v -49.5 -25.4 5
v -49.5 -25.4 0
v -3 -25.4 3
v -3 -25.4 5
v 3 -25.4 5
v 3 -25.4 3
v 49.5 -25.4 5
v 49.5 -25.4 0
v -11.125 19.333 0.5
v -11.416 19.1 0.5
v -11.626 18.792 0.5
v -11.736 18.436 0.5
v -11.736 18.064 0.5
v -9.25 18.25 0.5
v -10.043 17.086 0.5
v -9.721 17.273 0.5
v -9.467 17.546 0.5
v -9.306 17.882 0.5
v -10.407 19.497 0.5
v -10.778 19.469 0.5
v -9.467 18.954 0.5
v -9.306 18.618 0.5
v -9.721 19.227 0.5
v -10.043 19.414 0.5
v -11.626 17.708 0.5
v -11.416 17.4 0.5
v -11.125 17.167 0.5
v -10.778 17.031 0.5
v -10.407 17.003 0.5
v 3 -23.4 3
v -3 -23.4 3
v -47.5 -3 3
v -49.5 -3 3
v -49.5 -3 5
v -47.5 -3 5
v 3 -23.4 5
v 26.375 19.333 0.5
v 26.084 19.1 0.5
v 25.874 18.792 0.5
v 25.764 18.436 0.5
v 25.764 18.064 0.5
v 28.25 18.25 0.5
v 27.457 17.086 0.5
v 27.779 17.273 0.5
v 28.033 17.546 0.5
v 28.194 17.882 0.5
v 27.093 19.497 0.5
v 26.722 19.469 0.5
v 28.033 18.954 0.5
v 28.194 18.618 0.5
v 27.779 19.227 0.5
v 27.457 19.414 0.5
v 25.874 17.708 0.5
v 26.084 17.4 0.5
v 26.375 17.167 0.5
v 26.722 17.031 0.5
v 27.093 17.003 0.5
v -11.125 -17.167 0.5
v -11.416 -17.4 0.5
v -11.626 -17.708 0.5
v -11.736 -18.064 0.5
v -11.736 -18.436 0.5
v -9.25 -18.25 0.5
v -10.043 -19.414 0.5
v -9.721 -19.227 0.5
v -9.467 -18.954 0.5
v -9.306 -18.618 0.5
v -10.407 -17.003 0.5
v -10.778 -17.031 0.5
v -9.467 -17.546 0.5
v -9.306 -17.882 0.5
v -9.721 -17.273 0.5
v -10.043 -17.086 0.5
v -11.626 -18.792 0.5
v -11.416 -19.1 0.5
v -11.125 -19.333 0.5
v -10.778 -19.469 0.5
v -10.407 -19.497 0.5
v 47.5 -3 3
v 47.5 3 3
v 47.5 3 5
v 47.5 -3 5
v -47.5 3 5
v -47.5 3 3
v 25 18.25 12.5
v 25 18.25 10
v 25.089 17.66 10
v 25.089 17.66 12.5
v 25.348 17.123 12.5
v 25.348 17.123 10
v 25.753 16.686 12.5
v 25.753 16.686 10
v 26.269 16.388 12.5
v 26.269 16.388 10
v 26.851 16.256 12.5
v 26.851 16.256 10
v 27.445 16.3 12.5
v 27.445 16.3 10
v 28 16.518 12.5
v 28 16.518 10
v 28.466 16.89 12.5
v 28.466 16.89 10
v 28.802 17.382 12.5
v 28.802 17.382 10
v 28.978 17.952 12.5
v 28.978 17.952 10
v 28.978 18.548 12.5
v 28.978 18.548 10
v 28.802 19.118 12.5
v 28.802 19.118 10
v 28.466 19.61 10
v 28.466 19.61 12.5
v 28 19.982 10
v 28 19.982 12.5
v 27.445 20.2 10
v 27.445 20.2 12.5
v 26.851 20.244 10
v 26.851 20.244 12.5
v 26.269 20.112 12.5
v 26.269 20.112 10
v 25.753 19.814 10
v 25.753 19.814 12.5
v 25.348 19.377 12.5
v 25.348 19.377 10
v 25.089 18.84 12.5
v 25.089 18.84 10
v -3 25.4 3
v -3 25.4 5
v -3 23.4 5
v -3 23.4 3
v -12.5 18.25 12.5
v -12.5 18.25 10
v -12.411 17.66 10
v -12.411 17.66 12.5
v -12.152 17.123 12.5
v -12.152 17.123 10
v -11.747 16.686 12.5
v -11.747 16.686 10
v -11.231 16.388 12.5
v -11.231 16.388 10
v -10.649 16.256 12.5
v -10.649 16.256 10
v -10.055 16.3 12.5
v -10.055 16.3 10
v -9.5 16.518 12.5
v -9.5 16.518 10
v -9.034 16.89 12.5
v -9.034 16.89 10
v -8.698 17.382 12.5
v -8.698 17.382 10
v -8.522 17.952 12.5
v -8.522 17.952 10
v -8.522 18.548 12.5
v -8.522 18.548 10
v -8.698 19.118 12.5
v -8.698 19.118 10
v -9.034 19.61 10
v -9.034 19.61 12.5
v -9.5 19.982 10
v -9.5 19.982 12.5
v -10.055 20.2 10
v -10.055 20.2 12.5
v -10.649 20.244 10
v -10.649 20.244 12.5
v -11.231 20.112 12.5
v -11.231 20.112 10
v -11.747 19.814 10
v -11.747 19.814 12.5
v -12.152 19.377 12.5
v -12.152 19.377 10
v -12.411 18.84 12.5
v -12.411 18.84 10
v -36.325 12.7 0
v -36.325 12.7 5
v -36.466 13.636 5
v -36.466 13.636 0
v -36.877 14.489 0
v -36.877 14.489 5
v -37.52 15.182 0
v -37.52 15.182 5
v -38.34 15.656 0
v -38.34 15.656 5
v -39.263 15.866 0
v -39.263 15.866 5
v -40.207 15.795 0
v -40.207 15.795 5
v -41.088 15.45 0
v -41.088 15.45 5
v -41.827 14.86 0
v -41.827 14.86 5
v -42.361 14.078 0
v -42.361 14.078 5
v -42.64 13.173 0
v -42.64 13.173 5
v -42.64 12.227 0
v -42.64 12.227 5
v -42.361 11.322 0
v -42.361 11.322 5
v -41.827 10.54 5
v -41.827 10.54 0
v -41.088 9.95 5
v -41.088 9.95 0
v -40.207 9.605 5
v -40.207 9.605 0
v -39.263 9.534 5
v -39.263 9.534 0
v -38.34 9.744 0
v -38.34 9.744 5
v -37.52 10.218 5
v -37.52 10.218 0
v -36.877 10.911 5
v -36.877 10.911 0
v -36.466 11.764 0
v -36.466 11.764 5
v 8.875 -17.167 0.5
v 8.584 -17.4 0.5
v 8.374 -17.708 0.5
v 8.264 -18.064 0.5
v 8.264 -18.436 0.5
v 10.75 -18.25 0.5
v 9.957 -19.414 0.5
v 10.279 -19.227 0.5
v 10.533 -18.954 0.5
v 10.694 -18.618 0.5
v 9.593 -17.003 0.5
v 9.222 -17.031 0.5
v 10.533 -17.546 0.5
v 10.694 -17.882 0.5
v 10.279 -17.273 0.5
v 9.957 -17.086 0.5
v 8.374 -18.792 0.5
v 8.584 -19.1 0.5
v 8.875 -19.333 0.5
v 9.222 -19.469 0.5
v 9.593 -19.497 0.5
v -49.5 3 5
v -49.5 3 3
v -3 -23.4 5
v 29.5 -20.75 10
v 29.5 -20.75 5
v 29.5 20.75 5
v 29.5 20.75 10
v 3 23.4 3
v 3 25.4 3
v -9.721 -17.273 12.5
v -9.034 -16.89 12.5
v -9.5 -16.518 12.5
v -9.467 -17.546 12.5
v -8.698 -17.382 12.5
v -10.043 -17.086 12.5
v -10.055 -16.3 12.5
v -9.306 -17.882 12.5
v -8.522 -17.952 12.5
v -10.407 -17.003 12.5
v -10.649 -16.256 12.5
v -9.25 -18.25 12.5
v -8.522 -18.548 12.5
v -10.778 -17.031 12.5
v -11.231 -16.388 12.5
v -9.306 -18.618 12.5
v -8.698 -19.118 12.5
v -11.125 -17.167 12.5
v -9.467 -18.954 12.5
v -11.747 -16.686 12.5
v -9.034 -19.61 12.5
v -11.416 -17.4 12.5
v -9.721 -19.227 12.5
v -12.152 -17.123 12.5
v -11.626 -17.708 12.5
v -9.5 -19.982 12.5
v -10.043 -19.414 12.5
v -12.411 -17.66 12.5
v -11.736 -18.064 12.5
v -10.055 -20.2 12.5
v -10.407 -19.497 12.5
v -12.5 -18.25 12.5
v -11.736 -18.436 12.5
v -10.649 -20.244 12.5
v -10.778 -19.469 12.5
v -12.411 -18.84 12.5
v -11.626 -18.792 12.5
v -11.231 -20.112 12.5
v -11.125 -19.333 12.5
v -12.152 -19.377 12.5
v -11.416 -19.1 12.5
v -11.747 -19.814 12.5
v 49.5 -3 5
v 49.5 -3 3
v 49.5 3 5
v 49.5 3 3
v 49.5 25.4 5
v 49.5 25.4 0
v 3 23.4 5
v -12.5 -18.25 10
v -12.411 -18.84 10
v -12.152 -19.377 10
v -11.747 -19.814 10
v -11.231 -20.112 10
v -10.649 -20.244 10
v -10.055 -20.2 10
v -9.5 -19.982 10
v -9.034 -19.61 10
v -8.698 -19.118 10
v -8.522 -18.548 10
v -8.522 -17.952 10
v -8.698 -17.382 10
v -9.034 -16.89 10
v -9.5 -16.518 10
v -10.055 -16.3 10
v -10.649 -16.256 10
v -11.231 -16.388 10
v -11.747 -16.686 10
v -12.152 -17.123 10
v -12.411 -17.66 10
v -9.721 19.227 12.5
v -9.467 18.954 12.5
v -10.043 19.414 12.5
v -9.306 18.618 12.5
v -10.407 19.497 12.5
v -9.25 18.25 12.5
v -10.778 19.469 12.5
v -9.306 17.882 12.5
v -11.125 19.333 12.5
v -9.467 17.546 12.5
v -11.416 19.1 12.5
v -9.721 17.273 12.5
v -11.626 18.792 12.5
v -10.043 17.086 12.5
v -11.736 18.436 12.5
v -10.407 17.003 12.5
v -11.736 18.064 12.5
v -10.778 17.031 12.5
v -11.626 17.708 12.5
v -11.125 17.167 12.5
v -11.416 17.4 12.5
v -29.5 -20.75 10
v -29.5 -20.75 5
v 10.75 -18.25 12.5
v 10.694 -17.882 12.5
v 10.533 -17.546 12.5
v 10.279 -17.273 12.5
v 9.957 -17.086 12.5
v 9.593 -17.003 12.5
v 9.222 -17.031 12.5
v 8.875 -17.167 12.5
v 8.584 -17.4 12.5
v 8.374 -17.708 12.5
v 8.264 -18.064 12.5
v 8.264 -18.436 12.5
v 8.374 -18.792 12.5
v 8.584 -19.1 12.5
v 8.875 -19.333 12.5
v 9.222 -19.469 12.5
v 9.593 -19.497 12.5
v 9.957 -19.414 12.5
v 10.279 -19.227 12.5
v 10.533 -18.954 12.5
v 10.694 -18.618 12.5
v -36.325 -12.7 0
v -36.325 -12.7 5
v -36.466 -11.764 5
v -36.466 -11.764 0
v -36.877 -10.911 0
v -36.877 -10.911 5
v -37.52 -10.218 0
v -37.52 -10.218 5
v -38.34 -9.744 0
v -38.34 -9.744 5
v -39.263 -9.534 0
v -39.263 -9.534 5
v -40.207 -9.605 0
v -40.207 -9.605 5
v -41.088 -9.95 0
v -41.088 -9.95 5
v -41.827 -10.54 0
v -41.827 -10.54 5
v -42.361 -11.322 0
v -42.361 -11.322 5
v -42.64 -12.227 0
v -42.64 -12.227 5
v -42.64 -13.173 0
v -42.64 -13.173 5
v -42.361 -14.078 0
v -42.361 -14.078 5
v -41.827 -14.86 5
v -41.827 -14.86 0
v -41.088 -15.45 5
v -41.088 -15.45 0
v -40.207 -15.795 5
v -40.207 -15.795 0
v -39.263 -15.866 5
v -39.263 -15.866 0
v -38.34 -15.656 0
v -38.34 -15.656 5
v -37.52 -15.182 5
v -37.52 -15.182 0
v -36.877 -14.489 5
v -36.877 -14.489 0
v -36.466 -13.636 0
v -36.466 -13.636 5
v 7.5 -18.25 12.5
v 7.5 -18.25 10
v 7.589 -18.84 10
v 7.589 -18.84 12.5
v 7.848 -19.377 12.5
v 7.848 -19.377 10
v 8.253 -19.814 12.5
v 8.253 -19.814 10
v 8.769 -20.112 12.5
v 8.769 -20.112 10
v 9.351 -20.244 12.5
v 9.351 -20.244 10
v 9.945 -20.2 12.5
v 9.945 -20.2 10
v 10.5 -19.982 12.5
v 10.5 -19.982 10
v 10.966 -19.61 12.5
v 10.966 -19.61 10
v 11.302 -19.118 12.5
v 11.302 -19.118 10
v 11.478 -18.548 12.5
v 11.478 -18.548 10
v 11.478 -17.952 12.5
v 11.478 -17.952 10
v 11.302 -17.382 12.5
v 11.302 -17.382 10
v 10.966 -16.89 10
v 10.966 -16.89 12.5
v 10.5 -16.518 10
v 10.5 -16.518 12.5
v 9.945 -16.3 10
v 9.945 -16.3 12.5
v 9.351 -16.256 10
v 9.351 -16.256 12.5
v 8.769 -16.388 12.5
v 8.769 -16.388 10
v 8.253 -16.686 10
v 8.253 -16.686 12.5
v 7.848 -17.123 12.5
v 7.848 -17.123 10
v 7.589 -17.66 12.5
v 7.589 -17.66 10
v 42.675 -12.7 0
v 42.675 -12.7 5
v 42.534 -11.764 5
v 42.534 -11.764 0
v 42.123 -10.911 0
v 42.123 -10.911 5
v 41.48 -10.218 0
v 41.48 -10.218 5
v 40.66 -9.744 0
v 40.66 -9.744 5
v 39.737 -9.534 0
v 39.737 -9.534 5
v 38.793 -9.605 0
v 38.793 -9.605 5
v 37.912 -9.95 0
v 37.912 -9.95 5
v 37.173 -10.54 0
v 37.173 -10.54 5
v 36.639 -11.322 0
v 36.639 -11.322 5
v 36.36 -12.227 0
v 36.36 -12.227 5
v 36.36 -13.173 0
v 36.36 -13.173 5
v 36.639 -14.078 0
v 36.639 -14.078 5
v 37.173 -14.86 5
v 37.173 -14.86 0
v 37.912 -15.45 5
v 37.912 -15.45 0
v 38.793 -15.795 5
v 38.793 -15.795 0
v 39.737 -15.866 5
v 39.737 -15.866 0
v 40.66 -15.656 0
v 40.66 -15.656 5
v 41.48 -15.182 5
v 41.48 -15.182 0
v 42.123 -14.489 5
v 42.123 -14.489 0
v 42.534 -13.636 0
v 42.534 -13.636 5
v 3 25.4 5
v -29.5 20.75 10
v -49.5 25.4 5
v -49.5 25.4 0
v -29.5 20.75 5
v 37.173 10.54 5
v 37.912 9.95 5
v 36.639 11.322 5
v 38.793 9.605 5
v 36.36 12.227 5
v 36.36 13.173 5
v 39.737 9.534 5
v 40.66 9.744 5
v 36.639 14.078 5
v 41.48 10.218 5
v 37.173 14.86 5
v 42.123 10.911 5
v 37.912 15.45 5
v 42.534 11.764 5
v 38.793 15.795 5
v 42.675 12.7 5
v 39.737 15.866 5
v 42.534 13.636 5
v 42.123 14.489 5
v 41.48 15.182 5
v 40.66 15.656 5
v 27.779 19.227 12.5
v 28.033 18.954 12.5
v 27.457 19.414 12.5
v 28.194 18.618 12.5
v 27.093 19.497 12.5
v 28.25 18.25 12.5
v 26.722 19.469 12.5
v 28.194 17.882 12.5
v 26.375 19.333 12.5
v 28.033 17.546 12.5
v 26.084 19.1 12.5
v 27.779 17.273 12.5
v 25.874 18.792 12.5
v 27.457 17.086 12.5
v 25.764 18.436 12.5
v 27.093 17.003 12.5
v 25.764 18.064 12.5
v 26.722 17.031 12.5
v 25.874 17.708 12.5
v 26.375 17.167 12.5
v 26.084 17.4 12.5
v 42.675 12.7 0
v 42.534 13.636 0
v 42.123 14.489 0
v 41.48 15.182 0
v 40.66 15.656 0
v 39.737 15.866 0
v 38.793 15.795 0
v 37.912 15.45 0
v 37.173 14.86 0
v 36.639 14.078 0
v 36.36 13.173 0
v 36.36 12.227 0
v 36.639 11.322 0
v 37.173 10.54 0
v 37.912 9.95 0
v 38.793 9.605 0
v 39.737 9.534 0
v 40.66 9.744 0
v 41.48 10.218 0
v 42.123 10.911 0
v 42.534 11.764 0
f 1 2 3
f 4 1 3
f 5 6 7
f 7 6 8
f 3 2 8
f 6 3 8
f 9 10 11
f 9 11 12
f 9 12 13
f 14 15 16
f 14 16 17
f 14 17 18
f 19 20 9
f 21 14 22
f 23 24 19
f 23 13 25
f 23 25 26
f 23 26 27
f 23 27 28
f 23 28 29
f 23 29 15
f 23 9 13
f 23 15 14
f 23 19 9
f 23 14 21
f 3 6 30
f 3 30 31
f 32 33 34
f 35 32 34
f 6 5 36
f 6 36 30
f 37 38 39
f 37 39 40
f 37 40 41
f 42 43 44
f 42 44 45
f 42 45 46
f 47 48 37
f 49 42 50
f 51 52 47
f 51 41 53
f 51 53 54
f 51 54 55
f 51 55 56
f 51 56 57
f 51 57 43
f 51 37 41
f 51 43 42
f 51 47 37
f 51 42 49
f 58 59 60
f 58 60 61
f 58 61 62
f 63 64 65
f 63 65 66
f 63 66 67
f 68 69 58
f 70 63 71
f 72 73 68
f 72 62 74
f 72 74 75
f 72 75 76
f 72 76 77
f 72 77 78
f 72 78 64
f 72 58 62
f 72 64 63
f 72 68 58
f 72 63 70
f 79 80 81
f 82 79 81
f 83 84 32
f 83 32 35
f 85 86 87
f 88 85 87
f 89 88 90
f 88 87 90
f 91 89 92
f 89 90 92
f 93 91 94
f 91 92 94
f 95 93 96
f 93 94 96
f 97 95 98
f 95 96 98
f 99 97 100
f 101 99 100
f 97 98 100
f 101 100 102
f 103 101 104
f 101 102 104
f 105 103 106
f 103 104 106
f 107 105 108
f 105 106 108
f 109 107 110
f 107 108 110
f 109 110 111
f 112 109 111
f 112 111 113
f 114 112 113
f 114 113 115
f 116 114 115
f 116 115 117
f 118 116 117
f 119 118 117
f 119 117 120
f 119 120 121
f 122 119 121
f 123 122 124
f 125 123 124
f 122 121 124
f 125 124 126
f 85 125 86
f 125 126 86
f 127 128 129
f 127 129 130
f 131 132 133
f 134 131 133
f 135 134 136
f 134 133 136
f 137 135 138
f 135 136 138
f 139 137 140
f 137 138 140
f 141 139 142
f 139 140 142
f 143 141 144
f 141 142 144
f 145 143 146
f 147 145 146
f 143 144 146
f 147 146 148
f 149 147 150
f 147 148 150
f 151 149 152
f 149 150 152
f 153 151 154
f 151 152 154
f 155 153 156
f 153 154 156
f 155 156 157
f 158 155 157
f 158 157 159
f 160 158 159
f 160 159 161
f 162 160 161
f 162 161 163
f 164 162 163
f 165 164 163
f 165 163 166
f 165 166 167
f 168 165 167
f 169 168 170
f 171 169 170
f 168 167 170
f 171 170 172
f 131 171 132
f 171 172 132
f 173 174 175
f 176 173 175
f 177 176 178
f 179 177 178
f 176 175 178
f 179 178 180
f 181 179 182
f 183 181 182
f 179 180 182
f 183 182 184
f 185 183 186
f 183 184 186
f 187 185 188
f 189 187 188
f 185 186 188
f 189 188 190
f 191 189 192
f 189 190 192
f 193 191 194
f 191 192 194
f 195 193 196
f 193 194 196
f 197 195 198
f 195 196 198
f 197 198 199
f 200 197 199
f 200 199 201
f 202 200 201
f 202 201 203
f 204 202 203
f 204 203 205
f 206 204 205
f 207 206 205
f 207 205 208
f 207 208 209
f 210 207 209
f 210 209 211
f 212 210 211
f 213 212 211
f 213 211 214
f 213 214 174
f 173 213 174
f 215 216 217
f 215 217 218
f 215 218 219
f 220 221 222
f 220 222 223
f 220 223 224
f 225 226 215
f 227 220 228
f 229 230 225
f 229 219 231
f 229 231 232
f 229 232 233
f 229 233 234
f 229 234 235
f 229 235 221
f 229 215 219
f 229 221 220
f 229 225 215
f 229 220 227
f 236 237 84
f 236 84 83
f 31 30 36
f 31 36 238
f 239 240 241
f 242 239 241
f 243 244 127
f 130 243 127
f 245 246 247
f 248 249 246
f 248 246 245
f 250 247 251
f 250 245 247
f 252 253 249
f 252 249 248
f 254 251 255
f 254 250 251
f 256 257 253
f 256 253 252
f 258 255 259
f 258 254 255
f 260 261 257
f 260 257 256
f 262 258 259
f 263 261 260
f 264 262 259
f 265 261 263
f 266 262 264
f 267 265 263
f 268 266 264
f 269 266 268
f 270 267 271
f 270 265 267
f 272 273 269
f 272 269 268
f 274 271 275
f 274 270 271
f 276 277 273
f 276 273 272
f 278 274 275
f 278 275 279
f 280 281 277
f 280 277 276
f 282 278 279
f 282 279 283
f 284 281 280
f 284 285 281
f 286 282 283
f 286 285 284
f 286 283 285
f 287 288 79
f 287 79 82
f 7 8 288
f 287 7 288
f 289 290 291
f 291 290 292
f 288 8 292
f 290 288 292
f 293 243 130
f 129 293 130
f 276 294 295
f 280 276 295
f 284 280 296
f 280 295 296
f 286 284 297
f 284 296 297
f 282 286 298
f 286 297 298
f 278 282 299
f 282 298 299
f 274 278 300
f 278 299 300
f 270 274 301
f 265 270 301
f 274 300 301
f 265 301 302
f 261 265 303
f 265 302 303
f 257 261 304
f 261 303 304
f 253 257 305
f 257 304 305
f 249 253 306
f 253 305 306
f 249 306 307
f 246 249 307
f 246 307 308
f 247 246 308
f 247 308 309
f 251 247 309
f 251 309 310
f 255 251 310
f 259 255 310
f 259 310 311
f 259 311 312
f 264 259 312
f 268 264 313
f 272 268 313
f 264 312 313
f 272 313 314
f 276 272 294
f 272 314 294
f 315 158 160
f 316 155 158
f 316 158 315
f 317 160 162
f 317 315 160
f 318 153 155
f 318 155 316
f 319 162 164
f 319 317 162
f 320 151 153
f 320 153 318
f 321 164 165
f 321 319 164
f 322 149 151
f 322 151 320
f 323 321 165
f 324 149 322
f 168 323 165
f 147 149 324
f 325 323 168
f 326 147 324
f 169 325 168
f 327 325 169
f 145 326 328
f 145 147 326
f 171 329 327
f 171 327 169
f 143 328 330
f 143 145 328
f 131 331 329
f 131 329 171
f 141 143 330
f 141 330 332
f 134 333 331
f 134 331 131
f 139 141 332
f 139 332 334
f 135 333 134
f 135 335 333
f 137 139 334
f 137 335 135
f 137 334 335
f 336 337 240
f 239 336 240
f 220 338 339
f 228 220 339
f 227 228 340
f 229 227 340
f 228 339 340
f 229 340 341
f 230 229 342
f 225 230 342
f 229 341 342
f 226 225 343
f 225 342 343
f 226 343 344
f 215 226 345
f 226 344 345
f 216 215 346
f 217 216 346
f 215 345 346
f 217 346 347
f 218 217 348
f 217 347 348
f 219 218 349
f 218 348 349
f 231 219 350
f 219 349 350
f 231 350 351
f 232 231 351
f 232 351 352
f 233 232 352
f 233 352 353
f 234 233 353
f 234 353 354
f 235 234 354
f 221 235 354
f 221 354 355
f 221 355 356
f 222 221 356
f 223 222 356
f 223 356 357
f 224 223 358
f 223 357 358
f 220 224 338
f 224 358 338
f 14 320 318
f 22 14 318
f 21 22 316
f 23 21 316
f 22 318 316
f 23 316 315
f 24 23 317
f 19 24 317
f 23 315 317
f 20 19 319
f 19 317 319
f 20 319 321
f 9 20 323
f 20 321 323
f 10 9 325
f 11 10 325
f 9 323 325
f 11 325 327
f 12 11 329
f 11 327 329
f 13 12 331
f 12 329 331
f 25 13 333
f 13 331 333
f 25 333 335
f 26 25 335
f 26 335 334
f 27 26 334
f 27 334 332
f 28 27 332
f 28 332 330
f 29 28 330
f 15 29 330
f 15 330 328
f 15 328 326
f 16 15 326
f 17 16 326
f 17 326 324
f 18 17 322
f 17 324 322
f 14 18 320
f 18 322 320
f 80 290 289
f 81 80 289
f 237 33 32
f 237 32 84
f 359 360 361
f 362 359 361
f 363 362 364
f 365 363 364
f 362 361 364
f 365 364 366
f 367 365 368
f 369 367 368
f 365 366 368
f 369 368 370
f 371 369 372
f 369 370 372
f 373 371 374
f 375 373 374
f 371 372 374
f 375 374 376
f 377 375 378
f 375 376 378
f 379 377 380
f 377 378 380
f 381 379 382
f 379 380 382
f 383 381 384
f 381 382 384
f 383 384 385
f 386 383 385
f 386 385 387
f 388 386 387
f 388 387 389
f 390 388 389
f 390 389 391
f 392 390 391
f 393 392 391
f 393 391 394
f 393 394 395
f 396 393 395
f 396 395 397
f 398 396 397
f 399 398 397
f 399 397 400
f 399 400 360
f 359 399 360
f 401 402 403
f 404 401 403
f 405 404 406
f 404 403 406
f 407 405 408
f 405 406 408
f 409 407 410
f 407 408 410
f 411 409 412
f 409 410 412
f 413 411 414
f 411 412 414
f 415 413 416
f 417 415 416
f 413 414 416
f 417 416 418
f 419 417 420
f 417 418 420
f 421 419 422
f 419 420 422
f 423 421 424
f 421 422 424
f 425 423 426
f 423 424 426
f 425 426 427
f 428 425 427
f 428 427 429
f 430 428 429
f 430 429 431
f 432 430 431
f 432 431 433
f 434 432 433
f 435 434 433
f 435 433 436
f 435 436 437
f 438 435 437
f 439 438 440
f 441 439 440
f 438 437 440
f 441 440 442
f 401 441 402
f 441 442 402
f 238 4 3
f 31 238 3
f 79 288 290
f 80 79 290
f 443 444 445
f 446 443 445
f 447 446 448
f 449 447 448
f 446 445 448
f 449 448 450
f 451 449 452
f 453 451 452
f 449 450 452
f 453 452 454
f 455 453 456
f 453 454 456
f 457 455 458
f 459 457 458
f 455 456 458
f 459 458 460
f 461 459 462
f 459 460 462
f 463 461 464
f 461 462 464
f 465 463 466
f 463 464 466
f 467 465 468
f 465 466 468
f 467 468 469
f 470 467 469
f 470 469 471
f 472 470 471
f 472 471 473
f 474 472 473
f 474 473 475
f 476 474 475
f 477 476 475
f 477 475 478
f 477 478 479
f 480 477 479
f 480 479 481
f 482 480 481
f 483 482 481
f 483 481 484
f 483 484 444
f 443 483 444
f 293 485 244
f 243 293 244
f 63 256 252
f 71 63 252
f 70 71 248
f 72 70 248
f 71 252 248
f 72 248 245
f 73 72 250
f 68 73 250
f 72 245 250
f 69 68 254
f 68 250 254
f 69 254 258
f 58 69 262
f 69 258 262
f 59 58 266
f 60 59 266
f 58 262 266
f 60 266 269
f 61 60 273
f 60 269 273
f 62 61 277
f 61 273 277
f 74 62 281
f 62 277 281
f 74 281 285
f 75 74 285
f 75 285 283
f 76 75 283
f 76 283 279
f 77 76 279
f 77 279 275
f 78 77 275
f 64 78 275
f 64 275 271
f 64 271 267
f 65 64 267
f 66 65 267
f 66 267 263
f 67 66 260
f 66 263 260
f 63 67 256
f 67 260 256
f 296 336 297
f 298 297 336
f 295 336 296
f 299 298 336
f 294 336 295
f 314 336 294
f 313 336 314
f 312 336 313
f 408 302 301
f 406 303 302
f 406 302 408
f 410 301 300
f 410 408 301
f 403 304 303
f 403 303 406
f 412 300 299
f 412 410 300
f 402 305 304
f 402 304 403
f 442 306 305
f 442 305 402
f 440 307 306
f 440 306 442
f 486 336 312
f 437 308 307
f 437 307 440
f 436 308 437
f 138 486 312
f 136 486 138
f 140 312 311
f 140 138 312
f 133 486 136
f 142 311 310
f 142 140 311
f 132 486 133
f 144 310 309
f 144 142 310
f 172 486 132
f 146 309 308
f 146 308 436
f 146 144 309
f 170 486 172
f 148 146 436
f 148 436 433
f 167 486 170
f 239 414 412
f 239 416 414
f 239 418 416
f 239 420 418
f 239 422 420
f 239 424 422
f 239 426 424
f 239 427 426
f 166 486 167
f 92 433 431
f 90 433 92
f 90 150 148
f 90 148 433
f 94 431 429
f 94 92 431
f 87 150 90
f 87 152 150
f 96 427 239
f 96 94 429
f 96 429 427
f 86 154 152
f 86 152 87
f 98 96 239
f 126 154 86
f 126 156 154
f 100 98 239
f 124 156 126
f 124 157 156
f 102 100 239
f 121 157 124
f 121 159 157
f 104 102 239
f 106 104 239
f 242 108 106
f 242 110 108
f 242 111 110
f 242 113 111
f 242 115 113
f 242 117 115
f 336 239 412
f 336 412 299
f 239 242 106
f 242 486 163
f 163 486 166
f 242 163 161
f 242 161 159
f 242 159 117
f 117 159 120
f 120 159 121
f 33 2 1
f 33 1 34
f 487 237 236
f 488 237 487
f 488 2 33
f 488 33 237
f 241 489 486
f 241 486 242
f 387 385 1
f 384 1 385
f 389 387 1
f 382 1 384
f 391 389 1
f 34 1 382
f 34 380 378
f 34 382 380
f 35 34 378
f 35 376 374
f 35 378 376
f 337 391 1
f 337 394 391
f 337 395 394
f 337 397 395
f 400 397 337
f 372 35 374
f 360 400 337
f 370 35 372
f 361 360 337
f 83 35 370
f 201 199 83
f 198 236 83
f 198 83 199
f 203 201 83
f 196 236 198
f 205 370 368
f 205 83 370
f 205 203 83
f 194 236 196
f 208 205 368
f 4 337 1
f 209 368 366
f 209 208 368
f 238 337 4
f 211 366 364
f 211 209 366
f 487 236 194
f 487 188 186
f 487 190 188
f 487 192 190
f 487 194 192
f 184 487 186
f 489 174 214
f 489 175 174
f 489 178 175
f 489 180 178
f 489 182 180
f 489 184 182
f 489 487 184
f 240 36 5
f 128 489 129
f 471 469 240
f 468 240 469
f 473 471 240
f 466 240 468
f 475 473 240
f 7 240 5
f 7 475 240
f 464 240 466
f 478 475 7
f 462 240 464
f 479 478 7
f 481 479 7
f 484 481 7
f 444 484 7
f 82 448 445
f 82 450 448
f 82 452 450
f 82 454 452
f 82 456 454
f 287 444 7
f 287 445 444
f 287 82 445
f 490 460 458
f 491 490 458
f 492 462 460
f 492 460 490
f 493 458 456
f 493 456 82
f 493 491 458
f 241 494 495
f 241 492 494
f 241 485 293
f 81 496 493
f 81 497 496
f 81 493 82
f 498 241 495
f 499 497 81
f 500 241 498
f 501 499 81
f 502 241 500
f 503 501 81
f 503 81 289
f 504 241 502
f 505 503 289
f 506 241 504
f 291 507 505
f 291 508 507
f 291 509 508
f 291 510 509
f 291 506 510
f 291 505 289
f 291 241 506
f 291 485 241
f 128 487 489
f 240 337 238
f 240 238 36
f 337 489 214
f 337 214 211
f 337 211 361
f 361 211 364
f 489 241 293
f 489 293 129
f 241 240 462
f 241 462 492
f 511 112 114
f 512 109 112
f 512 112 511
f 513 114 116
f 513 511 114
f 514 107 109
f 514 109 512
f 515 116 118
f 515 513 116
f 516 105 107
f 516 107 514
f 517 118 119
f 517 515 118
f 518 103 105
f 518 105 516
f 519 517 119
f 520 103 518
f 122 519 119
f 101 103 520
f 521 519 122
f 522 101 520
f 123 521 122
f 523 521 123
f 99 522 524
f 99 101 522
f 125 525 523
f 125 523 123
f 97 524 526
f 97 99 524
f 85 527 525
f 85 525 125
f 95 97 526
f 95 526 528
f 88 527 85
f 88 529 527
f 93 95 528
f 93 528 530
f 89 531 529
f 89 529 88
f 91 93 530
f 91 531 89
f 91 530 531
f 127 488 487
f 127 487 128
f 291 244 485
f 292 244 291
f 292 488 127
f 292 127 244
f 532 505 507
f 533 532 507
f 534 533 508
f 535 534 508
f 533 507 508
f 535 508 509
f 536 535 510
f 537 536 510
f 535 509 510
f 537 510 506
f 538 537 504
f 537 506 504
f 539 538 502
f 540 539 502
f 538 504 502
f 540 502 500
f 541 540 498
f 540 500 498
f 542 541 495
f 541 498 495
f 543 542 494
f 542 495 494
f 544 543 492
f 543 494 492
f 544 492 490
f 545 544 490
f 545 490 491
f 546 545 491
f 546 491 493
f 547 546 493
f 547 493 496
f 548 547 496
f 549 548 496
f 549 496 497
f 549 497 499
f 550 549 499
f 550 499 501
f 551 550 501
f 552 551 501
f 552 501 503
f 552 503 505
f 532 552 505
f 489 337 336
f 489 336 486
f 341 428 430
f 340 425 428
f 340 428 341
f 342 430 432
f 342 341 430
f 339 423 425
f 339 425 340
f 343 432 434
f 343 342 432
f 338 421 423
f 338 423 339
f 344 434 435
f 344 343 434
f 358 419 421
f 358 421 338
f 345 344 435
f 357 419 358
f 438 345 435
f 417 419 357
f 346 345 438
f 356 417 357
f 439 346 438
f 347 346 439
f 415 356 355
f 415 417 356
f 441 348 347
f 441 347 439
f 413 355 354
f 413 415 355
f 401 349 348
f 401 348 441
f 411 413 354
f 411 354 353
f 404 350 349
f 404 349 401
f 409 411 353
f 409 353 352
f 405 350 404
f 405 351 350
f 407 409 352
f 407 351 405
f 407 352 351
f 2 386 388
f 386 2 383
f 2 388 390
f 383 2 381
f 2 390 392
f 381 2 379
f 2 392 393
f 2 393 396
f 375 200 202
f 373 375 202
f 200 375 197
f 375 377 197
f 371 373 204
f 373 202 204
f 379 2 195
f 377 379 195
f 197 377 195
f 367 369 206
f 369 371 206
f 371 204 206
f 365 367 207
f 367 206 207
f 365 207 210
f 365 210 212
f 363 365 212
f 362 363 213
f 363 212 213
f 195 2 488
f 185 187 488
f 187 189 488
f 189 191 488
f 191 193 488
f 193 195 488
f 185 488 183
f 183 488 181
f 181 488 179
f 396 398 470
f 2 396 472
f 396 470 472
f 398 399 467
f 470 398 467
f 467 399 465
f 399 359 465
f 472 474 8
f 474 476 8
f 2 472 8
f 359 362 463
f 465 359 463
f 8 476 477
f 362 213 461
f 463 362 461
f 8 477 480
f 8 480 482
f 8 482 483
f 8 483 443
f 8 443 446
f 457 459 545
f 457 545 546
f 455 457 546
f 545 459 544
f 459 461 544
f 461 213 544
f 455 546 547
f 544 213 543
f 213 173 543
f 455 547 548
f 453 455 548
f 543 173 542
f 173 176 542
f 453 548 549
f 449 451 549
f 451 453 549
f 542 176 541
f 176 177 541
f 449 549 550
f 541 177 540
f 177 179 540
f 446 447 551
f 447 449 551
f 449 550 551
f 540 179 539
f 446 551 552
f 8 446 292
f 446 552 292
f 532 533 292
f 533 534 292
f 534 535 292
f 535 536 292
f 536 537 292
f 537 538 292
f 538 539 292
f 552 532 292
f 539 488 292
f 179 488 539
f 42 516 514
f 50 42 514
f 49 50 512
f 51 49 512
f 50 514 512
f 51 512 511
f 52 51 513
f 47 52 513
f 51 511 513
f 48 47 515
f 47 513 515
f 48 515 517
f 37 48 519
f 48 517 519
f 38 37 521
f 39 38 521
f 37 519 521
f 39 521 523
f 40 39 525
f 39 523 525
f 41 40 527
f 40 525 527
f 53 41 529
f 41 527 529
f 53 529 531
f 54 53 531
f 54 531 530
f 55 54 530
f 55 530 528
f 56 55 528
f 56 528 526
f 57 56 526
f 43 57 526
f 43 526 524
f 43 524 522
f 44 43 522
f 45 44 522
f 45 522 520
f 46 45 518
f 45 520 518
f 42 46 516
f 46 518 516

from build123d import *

# Parameters (mm, degrees)
SKETCH1_W           = 99
SKETCH1_H           = 50.8
BOSS_EXTRUDE1_DEPTH = 5
SKETCH3_W           = 59
SKETCH3_H           = 41.5
BOSS_EXTRUDE2_DEPTH = 5
SKETCH2_R           = 3.175
CUT_EXTRUDE1_DEPTH  = 56.860630143
SKETCH4_R           = 2
BOSS_EXTRUDE3_DEPTH = 2.5
SKETCH5_R           = 1.25
CUT_EXTRUDE2_DEPTH  = 12
SKETCH6_W           = 6
SKETCH6_H           = 2
CUT_EXTRUDE3_DEPTH  = 2
SKETCH7_W           = 2
SKETCH7_H           = 6
CUT_EXTRUDE4_DEPTH  = 2


with BuildPart() as part:
    # Sketch1 → Boss-Extrude1 (new body)
    with BuildSketch(Plane.XY):
        Rectangle(SKETCH1_W, SKETCH1_H)
    extrude(amount=BOSS_EXTRUDE1_DEPTH)

    # Sketch3 → Boss-Extrude2 (add)
    with BuildSketch(Plane.XY.offset(5)):
        Rectangle(SKETCH3_W, SKETCH3_H)
    extrude(amount=BOSS_EXTRUDE2_DEPTH)

    # Sketch2 → Cut-Extrude1 (cut, through all)
    with BuildSketch(Plane.XY.offset(5)):
        with Locations((-39.5, 12.7)):
            Circle(SKETCH2_R)
        with Locations((-39.5, -12.7)):
            Circle(SKETCH2_R)
        with Locations((39.5, -12.7)):
            Circle(SKETCH2_R)
        with Locations((39.5, 12.7)):
            Circle(SKETCH2_R)
    extrude(amount=-CUT_EXTRUDE1_DEPTH, mode=Mode.SUBTRACT)

    # Sketch4 → Boss-Extrude3 (add)
    with BuildSketch(Plane.XY.offset(10)):
        with Locations(Location((-10.5, -18.25, 0), (0, 0, 180))):
            Circle(SKETCH4_R)
        with Locations(Location((9.5, -18.25, 0), (0, 0, 180))):
            Circle(SKETCH4_R)
        with Locations(Location((-10.5, 18.25, 0), (0, 0, 180))):
            Circle(SKETCH4_R)
        with Locations(Location((27, 18.25, 0), (0, 0, 180))):
            Circle(SKETCH4_R)
    extrude(amount=BOSS_EXTRUDE3_DEPTH)

    # Sketch5 → Cut-Extrude2 (cut)
    with BuildSketch(Plane.XY.offset(12.5)):
        with Locations((-10.5, 18.25)):
            Circle(SKETCH5_R)
        with Locations((27, 18.25)):
            Circle(SKETCH5_R)
        with Locations((9.5, -18.25)):
            Circle(SKETCH5_R)
        with Locations((-10.5, -18.25)):
            Circle(SKETCH5_R)
    extrude(amount=-CUT_EXTRUDE2_DEPTH, mode=Mode.SUBTRACT)

    # Sketch6 → Cut-Extrude3 (cut)
    with BuildSketch(Plane(origin=(0, -25.4, 0), x_dir=(-1, 0, 0), z_dir=(0, -1, 0))):
        with Locations((0, -4)):
            Rectangle(SKETCH6_W, SKETCH6_H)
    cut_extrude3 = extrude(amount=-CUT_EXTRUDE3_DEPTH, mode=Mode.SUBTRACT)

    # Sketch7 → Cut-Extrude4 (cut)
    with BuildSketch(Plane.ZY.offset(49.5)):
        with Locations((4, 0)):
            Rectangle(SKETCH7_W, SKETCH7_H)
    cut_extrude4 = extrude(amount=-CUT_EXTRUDE4_DEPTH, mode=Mode.SUBTRACT)

    # Mirror1: Cut-Extrude3 across plane
    add(cut_extrude3.mirror(Plane.ZX), mode=Mode.SUBTRACT)

    # Mirror2: Cut-Extrude4 across plane
    add(cut_extrude4.mirror(Plane(origin=(0, 0, 0), x_dir=(0, 0, 1), z_dir=(1, 0, 0))), mode=Mode.SUBTRACT)


solid = part.part
